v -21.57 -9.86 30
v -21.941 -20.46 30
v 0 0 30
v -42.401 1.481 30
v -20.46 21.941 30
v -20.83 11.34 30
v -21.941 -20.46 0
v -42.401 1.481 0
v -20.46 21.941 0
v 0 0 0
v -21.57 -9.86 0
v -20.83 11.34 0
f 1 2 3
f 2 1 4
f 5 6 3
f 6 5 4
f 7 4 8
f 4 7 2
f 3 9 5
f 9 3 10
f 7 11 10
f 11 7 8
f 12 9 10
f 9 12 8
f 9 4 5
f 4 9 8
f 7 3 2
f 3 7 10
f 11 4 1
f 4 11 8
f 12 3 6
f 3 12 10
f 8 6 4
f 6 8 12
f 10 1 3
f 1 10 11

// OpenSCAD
rotate([0,0,88])
rotate([0,-90,0]){
    difference(){
        rotate([-45,0,0]) {
            cube([30, 30, 30]);
        }
        scale([1,1,0.5]) {
            rotate([-45,0,0]) {
                cube([30, 30, 30]);
            }
        }
    }
}
